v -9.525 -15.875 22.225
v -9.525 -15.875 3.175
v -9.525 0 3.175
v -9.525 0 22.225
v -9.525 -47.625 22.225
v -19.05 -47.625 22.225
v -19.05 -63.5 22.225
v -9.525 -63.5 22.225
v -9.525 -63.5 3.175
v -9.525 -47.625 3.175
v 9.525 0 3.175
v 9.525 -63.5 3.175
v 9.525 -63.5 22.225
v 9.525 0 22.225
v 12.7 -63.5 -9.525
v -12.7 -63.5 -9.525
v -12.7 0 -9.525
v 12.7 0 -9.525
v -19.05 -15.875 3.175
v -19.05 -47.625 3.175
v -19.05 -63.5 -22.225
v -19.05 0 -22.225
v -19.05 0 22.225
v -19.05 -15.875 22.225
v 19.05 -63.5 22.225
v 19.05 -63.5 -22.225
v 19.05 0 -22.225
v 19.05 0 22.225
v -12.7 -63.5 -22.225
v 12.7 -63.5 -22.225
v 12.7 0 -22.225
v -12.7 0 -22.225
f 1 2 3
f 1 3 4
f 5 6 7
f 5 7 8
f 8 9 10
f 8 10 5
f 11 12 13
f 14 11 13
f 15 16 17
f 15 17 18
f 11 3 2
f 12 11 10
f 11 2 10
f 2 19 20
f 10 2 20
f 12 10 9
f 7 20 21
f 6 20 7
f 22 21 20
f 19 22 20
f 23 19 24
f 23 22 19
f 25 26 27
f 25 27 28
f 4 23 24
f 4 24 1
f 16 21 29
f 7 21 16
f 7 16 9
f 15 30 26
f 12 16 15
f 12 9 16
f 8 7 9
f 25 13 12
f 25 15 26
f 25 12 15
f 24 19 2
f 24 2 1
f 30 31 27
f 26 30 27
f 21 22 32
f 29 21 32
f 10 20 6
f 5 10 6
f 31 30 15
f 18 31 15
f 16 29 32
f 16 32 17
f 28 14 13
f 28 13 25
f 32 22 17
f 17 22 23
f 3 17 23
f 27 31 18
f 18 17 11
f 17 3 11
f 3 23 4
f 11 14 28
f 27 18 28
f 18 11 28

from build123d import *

# Parameters (mm, degrees)
F0_W     = 38.1
F0_H     = 44.45
F1_DEPTH = 63.5
F2_W     = 19.05
F2_H     = 19.05
F3_DEPTH = 63.501
F4_W     = 25.4
F4_H     = 12.7
F5_DEPTH = 63.501
F6_W     = 31.75
F6_H     = 19.05
F7_DEPTH = 9.525


with BuildPart() as f1:
    # F0 (on Front) → F1 (new body)
    with BuildSketch(Plane.XZ):
        Rectangle(F0_W, F0_H)
    extrude(amount=F1_DEPTH)

    # F2 (on face) → F3 (cut, through all)
    with BuildSketch(Plane.XZ.offset(63.5)):
        with Locations((0, 12.7)):
            Rectangle(F2_W, F2_H)
    extrude(amount=-F3_DEPTH, mode=Mode.SUBTRACT)

    # F4 (on face) → F5 (cut, through all)
    with BuildSketch(Plane.XZ.offset(63.5)):
        with Locations((0, -15.875)):
            Rectangle(F4_W, F4_H)
    extrude(amount=-F5_DEPTH, mode=Mode.SUBTRACT)

    # F6 (on face) → F7 (cut, through all)
    with BuildSketch(Plane(origin=(-19.05, 0, 0), x_dir=(0, -1, 0), z_dir=(-1, 0, 0))):
        with Locations((31.75, 12.7)):
            Rectangle(F6_W, F6_H)
    extrude(amount=-F7_DEPTH, mode=Mode.SUBTRACT)


solid = f1.part
